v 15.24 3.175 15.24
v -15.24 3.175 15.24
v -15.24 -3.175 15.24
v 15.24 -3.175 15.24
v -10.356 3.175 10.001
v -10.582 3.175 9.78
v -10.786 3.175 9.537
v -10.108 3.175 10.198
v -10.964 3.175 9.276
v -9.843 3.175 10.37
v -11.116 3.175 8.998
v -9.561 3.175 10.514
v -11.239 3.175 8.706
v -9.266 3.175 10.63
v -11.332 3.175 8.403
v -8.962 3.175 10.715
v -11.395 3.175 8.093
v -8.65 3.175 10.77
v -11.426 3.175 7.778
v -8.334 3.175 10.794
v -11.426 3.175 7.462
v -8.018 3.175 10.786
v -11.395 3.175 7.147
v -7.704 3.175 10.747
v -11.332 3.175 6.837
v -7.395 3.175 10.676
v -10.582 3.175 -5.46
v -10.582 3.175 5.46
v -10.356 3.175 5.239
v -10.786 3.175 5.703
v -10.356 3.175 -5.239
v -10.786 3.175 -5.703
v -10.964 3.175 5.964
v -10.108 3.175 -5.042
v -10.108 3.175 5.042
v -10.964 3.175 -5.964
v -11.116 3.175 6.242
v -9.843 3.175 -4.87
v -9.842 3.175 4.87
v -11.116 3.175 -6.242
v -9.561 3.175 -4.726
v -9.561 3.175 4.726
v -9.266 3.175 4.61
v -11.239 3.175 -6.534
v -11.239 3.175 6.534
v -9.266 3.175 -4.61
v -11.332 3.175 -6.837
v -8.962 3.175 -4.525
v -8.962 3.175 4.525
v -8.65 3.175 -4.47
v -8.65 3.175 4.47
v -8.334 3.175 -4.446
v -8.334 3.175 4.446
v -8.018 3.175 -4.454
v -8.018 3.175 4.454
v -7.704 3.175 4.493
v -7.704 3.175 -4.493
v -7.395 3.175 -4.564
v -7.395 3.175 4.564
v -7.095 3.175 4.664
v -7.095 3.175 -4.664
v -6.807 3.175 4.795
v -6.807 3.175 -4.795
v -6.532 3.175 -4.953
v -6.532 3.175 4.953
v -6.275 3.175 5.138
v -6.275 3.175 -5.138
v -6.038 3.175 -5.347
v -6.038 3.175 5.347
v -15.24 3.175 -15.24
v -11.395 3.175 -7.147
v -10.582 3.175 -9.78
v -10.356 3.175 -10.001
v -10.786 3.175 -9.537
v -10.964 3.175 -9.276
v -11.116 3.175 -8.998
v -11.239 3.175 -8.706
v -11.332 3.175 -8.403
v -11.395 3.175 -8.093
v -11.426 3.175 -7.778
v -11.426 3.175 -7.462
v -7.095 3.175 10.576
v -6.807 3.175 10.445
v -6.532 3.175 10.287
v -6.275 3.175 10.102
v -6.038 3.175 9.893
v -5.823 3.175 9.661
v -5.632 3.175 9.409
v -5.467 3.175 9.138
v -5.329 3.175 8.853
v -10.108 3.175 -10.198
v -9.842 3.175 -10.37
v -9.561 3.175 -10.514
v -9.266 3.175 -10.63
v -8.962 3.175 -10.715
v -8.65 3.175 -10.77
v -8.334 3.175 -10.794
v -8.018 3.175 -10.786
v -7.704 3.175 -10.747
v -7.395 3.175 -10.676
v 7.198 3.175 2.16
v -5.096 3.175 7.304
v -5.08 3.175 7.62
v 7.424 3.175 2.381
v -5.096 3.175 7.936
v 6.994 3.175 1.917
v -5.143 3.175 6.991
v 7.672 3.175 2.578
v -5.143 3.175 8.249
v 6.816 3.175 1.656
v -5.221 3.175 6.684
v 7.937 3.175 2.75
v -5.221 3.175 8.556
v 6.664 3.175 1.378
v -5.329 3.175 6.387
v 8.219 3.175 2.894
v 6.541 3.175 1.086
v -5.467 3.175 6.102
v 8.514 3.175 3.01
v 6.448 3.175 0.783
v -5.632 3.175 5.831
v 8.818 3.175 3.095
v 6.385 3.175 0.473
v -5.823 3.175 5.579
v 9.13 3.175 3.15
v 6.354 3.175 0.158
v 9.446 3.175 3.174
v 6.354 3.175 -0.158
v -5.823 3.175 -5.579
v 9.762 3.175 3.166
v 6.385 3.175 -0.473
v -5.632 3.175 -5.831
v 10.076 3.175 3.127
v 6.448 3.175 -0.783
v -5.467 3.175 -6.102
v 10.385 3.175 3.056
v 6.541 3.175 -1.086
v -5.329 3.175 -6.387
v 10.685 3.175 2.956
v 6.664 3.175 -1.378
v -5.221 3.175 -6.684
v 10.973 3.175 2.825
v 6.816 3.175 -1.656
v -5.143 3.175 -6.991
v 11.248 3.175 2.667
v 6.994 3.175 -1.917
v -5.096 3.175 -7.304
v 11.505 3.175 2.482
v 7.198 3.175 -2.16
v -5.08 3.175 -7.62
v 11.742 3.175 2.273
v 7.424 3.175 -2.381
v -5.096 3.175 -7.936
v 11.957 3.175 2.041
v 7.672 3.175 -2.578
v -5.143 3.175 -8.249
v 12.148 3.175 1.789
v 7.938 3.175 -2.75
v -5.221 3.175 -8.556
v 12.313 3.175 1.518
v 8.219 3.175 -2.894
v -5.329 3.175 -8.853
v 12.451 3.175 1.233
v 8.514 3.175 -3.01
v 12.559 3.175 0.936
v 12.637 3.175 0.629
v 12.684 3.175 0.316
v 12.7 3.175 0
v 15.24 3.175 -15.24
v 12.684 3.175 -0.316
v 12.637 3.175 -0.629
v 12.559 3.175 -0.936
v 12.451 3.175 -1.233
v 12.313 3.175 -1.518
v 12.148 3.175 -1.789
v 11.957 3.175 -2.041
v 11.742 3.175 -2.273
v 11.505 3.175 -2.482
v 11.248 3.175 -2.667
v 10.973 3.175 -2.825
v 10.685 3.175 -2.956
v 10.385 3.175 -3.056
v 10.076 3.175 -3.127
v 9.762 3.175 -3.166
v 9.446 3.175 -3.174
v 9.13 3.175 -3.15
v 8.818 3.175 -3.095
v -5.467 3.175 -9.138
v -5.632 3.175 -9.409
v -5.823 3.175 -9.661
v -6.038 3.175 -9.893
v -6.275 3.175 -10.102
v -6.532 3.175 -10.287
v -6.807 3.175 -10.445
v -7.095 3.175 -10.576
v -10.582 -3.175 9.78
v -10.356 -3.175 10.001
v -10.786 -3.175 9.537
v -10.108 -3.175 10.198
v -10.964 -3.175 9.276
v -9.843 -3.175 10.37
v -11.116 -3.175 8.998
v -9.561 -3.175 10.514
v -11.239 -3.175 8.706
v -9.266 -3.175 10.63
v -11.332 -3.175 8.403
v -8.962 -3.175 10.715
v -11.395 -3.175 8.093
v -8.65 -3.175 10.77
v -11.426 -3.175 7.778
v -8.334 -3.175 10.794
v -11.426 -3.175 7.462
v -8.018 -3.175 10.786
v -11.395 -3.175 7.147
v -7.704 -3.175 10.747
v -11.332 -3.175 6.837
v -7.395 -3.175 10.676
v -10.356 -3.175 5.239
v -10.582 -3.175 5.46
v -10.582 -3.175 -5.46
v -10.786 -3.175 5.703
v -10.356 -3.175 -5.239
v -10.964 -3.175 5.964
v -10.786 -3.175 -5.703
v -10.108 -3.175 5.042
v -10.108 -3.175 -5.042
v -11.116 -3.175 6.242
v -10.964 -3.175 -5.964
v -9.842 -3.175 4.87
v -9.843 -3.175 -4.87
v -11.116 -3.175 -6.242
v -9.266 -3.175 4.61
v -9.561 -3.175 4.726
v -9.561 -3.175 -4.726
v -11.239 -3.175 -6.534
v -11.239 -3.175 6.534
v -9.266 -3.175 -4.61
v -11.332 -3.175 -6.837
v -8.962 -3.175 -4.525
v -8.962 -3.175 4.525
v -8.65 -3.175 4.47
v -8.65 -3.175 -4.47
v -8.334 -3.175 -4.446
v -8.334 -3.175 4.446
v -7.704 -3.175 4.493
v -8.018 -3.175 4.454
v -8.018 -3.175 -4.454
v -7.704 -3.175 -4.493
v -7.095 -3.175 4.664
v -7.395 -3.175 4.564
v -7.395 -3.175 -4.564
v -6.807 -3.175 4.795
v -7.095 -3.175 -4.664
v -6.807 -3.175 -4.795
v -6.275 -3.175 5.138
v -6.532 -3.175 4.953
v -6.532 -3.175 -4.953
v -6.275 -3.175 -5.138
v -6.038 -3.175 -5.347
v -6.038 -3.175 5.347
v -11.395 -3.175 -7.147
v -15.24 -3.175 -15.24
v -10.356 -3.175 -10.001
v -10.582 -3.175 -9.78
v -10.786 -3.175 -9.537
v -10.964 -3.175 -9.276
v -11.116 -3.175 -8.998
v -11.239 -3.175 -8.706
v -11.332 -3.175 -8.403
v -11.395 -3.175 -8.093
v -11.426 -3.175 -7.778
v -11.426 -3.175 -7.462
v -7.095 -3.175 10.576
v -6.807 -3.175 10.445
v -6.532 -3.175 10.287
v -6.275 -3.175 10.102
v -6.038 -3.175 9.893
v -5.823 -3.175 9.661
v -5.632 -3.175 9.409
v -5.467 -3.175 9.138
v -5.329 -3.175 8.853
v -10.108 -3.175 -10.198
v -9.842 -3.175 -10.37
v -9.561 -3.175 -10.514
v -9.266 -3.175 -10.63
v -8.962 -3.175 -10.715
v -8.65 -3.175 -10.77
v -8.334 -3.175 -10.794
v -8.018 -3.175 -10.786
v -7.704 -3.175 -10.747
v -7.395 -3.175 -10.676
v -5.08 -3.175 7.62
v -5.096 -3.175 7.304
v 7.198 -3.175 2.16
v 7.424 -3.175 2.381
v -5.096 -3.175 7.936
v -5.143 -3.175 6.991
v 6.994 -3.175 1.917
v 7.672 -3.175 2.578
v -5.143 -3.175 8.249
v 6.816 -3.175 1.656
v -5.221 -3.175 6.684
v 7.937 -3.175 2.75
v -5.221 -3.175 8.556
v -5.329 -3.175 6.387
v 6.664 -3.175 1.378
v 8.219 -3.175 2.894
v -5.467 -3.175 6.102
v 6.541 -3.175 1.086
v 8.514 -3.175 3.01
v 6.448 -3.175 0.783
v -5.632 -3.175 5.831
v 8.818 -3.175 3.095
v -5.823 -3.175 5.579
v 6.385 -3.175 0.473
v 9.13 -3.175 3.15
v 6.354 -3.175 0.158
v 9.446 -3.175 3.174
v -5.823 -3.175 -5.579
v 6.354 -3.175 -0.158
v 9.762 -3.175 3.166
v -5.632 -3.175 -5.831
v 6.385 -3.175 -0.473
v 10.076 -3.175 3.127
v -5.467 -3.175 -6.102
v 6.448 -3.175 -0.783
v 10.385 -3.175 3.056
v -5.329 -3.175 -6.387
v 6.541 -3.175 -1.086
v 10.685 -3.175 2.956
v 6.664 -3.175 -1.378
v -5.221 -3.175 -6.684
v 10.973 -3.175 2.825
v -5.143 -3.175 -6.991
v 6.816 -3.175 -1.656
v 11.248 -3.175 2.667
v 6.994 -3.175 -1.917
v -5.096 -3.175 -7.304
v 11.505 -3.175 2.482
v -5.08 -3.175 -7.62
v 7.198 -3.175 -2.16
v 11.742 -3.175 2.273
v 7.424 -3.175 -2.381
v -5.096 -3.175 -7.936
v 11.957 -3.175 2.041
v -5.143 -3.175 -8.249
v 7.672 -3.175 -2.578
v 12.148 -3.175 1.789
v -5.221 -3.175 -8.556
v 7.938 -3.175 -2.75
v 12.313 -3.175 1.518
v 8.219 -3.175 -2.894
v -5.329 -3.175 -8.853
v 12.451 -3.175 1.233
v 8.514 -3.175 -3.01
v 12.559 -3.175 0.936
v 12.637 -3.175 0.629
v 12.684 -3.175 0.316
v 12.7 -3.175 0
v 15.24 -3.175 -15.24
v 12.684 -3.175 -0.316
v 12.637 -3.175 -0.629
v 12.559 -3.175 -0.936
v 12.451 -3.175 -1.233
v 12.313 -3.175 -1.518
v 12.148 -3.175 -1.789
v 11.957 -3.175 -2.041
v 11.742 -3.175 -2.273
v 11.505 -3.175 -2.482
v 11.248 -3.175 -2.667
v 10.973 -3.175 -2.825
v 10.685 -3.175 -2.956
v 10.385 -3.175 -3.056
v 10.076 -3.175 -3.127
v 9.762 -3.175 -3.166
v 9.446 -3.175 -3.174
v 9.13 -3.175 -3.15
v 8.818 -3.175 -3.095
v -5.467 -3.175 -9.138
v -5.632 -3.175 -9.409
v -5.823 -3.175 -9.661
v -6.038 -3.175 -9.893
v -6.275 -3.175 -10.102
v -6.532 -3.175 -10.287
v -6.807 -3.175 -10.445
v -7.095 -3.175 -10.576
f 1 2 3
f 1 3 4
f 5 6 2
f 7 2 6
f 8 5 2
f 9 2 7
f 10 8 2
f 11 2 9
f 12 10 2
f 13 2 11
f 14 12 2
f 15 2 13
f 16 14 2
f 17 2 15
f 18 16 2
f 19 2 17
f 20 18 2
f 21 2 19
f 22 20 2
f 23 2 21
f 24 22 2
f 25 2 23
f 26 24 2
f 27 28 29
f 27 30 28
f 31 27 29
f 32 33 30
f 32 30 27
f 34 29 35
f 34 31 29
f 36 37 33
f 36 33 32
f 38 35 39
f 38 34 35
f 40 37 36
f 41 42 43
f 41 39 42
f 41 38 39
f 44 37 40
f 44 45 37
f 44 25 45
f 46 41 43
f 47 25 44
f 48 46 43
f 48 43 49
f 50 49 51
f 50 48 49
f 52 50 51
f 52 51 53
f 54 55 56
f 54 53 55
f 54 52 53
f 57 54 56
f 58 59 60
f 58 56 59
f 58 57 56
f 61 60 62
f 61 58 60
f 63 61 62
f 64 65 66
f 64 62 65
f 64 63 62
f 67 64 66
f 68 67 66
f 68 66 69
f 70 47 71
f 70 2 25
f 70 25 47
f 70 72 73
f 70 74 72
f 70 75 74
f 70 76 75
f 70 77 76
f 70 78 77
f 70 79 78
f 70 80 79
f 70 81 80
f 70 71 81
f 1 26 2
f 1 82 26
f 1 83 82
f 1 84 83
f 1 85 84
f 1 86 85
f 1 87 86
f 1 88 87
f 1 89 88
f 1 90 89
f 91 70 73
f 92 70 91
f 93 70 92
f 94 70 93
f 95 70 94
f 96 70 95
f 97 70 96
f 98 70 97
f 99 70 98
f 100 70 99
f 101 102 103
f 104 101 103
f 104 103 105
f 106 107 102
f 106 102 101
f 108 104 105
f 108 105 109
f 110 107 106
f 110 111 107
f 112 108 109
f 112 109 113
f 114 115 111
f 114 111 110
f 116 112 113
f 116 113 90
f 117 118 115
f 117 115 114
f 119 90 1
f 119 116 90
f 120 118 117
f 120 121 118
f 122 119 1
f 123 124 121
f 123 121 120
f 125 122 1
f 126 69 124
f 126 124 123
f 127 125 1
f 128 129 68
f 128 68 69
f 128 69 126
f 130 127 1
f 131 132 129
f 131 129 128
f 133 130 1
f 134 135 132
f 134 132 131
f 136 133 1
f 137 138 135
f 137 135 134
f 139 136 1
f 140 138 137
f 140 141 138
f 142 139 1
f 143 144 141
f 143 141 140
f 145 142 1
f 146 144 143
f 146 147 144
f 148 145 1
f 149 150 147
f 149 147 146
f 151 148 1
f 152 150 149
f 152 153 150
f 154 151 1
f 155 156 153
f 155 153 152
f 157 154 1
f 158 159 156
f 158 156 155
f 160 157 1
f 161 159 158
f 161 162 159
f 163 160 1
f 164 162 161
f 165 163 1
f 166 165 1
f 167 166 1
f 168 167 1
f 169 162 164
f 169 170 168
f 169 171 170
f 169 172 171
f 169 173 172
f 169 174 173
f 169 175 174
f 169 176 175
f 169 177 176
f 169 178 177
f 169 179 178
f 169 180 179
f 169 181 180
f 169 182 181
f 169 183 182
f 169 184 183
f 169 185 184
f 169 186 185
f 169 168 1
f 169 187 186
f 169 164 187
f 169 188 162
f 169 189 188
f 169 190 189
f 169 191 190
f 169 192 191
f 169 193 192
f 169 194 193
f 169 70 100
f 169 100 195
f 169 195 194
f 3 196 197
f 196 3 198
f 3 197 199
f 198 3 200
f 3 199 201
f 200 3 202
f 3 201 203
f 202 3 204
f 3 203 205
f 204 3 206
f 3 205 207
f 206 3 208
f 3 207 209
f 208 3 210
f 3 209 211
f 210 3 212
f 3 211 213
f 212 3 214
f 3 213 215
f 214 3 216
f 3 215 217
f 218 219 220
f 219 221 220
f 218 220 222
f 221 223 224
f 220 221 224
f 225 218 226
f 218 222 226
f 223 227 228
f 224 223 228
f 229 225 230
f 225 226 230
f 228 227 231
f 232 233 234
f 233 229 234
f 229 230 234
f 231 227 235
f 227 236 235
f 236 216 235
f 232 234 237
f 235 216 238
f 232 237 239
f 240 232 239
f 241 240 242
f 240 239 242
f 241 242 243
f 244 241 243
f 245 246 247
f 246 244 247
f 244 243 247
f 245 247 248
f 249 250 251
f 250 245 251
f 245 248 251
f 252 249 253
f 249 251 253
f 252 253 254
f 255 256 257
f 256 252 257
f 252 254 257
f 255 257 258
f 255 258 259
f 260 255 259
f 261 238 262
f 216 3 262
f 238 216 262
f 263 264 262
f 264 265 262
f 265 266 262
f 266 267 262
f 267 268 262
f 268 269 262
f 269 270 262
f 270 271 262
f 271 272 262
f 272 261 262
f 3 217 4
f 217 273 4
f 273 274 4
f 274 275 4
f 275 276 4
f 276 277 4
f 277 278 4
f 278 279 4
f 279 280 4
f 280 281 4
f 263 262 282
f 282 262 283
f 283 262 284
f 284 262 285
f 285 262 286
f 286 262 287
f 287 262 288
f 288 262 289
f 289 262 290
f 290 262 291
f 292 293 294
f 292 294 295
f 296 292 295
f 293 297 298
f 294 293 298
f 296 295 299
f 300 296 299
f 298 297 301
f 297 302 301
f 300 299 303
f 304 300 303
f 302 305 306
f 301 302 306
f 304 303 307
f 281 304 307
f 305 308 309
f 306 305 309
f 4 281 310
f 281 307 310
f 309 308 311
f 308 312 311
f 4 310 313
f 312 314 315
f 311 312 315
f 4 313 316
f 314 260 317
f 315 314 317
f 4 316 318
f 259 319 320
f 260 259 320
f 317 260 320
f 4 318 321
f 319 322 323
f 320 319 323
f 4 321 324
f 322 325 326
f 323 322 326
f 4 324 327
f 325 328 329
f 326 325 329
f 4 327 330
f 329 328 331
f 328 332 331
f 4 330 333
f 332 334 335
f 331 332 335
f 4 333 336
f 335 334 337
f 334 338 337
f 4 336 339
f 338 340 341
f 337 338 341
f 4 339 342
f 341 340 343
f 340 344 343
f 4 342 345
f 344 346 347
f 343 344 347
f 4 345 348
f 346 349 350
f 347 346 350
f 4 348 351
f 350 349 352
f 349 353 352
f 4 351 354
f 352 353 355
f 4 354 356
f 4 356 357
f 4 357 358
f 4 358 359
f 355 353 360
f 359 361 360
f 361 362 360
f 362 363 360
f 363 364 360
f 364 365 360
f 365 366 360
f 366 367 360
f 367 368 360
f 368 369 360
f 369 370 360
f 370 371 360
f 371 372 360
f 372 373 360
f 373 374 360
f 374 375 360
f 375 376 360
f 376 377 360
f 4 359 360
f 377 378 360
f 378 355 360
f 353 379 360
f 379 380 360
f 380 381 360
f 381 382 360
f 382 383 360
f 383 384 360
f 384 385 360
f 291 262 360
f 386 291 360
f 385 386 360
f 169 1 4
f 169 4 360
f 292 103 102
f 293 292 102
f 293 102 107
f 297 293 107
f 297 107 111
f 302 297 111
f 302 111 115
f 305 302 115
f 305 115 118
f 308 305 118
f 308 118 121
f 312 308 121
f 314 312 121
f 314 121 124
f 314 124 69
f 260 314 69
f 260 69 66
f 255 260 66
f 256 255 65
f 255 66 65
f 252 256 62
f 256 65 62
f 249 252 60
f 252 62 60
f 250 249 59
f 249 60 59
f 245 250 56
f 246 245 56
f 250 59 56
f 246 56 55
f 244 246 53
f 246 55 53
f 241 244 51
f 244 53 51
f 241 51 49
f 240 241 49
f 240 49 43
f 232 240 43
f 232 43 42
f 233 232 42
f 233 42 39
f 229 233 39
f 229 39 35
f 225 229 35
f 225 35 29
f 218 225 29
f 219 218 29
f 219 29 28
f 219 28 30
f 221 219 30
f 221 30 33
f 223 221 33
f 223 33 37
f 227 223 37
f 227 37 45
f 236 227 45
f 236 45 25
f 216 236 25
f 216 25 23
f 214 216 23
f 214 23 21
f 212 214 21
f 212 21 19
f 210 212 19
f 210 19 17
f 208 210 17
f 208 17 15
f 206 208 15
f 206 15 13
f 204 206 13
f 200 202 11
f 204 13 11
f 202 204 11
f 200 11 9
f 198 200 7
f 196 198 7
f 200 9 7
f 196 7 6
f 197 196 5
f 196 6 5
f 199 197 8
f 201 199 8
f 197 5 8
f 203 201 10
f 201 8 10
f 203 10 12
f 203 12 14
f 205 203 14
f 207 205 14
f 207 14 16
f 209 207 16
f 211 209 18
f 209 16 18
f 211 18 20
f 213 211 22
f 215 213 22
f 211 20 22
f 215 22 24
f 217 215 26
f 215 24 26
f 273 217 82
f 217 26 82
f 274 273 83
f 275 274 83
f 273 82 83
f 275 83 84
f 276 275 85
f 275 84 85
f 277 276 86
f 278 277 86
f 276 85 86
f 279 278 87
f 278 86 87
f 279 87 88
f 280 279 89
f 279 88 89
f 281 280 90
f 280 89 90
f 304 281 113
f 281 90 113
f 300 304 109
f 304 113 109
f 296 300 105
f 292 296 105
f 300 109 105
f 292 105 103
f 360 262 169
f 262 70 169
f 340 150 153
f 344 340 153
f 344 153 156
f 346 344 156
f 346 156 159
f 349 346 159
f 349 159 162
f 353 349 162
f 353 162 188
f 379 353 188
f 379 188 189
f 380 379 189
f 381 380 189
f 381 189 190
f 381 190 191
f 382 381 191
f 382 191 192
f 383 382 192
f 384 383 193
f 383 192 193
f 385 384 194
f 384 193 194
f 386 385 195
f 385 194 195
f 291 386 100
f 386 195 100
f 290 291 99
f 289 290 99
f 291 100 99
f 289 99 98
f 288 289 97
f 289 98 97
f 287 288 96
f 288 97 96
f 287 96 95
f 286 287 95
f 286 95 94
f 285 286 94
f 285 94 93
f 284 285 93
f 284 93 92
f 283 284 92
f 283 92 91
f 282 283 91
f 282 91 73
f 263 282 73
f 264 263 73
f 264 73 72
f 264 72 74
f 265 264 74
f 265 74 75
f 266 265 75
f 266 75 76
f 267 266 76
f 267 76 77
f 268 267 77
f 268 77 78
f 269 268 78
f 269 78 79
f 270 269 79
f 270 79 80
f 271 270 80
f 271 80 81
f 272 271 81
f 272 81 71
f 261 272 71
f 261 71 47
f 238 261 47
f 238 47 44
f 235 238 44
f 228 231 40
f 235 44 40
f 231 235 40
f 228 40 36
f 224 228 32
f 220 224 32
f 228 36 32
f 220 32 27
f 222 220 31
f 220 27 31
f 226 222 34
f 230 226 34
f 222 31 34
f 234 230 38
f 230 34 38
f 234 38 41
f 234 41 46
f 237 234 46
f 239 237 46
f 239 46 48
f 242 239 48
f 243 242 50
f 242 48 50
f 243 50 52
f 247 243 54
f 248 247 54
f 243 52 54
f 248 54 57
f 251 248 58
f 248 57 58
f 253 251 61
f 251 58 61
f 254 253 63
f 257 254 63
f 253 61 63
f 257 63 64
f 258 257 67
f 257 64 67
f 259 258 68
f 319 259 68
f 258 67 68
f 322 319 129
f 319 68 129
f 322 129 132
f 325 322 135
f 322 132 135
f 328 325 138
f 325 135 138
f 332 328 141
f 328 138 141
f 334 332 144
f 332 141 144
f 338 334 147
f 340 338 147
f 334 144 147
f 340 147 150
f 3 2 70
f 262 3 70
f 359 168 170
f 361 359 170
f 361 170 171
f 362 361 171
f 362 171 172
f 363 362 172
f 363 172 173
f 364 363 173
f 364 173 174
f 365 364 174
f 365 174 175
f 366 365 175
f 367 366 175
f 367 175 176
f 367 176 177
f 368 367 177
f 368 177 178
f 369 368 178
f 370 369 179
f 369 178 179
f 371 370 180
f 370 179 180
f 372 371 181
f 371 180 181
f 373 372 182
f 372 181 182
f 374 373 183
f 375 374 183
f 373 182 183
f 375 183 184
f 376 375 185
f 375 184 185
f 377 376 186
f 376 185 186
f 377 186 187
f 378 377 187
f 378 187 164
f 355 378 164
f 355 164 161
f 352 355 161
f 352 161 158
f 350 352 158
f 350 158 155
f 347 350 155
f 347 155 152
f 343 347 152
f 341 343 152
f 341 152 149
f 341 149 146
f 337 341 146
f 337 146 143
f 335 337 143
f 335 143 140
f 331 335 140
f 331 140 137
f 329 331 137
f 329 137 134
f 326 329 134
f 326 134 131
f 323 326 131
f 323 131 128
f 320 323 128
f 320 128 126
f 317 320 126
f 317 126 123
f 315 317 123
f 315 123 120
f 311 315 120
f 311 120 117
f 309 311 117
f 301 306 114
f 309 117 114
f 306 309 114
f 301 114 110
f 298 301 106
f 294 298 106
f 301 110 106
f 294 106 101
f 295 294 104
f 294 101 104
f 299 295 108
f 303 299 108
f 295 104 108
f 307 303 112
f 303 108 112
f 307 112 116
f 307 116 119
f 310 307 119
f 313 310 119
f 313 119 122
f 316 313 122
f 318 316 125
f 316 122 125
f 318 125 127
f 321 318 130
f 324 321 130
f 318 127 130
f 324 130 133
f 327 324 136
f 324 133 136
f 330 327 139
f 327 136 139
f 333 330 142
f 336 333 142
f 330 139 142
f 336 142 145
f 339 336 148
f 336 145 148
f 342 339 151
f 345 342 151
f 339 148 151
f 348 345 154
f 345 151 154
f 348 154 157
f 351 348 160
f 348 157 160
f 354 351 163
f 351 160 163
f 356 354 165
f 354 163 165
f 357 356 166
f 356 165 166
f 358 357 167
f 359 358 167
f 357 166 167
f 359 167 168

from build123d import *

# Parameters (mm, degrees)
SKETCH1_W           = 30.48
SKETCH1_H           = 30.48
BOSS_EXTRUDE1_DEPTH = 3.175
CUT_EXTRUDE1_REACH  = 8.35
SKETCH2_R           = 3.175


with BuildPart() as part:
    # Sketch1 → Boss-Extrude1 (new body, symmetric)
    with BuildSketch(Plane(origin=(0, 0, 0), x_dir=(1, 0, 0), z_dir=(0, 1, 0))):
        Rectangle(SKETCH1_W, SKETCH1_H)
    extrude(amount=BOSS_EXTRUDE1_DEPTH, both=True)

    # Sketch2 → Cut-Extrude1 (cut, up to next)
    with BuildSketch(Plane(origin=(0, 3.175, 0), x_dir=(1, 0, 0), z_dir=(0, 1, 0)), mode=Mode.PRIVATE) as cut_extrude1_sk1:
        with Locations((9.525, 0)):
            Circle(SKETCH2_R)
    cut_extrude1_tool1 = extrude(cut_extrude1_sk1.sketch, amount=-CUT_EXTRUDE1_REACH, mode=Mode.PRIVATE) & part.part
    add(cut_extrude1_tool1.solids().sort_by_distance((9.525, 3.175, 0))[0], mode=Mode.SUBTRACT)
    # Sketch2 → Cut-Extrude1 (cut, up to next)
    with BuildSketch(Plane(origin=(0, 3.175, 0), x_dir=(1, 0, 0), z_dir=(0, 1, 0)), mode=Mode.PRIVATE) as cut_extrude1_sk2:
        with Locations((-8.255, -7.62)):
            Circle(SKETCH2_R)
    cut_extrude1_tool2 = extrude(cut_extrude1_sk2.sketch, amount=-CUT_EXTRUDE1_REACH, mode=Mode.PRIVATE) & part.part
    add(cut_extrude1_tool2.solids().sort_by_distance((-8.255, 3.175, 7.62))[0], mode=Mode.SUBTRACT)
    # Sketch2 → Cut-Extrude1 (cut, up to next)
    with BuildSketch(Plane(origin=(0, 3.175, 0), x_dir=(1, 0, 0), z_dir=(0, 1, 0)), mode=Mode.PRIVATE) as cut_extrude1_sk3:
        with Locations((-8.255, 7.62)):
            Circle(SKETCH2_R)
    cut_extrude1_tool3 = extrude(cut_extrude1_sk3.sketch, amount=-CUT_EXTRUDE1_REACH, mode=Mode.PRIVATE) & part.part
    add(cut_extrude1_tool3.solids().sort_by_distance((-8.255, 3.175, -7.62))[0], mode=Mode.SUBTRACT)


solid = part.part
